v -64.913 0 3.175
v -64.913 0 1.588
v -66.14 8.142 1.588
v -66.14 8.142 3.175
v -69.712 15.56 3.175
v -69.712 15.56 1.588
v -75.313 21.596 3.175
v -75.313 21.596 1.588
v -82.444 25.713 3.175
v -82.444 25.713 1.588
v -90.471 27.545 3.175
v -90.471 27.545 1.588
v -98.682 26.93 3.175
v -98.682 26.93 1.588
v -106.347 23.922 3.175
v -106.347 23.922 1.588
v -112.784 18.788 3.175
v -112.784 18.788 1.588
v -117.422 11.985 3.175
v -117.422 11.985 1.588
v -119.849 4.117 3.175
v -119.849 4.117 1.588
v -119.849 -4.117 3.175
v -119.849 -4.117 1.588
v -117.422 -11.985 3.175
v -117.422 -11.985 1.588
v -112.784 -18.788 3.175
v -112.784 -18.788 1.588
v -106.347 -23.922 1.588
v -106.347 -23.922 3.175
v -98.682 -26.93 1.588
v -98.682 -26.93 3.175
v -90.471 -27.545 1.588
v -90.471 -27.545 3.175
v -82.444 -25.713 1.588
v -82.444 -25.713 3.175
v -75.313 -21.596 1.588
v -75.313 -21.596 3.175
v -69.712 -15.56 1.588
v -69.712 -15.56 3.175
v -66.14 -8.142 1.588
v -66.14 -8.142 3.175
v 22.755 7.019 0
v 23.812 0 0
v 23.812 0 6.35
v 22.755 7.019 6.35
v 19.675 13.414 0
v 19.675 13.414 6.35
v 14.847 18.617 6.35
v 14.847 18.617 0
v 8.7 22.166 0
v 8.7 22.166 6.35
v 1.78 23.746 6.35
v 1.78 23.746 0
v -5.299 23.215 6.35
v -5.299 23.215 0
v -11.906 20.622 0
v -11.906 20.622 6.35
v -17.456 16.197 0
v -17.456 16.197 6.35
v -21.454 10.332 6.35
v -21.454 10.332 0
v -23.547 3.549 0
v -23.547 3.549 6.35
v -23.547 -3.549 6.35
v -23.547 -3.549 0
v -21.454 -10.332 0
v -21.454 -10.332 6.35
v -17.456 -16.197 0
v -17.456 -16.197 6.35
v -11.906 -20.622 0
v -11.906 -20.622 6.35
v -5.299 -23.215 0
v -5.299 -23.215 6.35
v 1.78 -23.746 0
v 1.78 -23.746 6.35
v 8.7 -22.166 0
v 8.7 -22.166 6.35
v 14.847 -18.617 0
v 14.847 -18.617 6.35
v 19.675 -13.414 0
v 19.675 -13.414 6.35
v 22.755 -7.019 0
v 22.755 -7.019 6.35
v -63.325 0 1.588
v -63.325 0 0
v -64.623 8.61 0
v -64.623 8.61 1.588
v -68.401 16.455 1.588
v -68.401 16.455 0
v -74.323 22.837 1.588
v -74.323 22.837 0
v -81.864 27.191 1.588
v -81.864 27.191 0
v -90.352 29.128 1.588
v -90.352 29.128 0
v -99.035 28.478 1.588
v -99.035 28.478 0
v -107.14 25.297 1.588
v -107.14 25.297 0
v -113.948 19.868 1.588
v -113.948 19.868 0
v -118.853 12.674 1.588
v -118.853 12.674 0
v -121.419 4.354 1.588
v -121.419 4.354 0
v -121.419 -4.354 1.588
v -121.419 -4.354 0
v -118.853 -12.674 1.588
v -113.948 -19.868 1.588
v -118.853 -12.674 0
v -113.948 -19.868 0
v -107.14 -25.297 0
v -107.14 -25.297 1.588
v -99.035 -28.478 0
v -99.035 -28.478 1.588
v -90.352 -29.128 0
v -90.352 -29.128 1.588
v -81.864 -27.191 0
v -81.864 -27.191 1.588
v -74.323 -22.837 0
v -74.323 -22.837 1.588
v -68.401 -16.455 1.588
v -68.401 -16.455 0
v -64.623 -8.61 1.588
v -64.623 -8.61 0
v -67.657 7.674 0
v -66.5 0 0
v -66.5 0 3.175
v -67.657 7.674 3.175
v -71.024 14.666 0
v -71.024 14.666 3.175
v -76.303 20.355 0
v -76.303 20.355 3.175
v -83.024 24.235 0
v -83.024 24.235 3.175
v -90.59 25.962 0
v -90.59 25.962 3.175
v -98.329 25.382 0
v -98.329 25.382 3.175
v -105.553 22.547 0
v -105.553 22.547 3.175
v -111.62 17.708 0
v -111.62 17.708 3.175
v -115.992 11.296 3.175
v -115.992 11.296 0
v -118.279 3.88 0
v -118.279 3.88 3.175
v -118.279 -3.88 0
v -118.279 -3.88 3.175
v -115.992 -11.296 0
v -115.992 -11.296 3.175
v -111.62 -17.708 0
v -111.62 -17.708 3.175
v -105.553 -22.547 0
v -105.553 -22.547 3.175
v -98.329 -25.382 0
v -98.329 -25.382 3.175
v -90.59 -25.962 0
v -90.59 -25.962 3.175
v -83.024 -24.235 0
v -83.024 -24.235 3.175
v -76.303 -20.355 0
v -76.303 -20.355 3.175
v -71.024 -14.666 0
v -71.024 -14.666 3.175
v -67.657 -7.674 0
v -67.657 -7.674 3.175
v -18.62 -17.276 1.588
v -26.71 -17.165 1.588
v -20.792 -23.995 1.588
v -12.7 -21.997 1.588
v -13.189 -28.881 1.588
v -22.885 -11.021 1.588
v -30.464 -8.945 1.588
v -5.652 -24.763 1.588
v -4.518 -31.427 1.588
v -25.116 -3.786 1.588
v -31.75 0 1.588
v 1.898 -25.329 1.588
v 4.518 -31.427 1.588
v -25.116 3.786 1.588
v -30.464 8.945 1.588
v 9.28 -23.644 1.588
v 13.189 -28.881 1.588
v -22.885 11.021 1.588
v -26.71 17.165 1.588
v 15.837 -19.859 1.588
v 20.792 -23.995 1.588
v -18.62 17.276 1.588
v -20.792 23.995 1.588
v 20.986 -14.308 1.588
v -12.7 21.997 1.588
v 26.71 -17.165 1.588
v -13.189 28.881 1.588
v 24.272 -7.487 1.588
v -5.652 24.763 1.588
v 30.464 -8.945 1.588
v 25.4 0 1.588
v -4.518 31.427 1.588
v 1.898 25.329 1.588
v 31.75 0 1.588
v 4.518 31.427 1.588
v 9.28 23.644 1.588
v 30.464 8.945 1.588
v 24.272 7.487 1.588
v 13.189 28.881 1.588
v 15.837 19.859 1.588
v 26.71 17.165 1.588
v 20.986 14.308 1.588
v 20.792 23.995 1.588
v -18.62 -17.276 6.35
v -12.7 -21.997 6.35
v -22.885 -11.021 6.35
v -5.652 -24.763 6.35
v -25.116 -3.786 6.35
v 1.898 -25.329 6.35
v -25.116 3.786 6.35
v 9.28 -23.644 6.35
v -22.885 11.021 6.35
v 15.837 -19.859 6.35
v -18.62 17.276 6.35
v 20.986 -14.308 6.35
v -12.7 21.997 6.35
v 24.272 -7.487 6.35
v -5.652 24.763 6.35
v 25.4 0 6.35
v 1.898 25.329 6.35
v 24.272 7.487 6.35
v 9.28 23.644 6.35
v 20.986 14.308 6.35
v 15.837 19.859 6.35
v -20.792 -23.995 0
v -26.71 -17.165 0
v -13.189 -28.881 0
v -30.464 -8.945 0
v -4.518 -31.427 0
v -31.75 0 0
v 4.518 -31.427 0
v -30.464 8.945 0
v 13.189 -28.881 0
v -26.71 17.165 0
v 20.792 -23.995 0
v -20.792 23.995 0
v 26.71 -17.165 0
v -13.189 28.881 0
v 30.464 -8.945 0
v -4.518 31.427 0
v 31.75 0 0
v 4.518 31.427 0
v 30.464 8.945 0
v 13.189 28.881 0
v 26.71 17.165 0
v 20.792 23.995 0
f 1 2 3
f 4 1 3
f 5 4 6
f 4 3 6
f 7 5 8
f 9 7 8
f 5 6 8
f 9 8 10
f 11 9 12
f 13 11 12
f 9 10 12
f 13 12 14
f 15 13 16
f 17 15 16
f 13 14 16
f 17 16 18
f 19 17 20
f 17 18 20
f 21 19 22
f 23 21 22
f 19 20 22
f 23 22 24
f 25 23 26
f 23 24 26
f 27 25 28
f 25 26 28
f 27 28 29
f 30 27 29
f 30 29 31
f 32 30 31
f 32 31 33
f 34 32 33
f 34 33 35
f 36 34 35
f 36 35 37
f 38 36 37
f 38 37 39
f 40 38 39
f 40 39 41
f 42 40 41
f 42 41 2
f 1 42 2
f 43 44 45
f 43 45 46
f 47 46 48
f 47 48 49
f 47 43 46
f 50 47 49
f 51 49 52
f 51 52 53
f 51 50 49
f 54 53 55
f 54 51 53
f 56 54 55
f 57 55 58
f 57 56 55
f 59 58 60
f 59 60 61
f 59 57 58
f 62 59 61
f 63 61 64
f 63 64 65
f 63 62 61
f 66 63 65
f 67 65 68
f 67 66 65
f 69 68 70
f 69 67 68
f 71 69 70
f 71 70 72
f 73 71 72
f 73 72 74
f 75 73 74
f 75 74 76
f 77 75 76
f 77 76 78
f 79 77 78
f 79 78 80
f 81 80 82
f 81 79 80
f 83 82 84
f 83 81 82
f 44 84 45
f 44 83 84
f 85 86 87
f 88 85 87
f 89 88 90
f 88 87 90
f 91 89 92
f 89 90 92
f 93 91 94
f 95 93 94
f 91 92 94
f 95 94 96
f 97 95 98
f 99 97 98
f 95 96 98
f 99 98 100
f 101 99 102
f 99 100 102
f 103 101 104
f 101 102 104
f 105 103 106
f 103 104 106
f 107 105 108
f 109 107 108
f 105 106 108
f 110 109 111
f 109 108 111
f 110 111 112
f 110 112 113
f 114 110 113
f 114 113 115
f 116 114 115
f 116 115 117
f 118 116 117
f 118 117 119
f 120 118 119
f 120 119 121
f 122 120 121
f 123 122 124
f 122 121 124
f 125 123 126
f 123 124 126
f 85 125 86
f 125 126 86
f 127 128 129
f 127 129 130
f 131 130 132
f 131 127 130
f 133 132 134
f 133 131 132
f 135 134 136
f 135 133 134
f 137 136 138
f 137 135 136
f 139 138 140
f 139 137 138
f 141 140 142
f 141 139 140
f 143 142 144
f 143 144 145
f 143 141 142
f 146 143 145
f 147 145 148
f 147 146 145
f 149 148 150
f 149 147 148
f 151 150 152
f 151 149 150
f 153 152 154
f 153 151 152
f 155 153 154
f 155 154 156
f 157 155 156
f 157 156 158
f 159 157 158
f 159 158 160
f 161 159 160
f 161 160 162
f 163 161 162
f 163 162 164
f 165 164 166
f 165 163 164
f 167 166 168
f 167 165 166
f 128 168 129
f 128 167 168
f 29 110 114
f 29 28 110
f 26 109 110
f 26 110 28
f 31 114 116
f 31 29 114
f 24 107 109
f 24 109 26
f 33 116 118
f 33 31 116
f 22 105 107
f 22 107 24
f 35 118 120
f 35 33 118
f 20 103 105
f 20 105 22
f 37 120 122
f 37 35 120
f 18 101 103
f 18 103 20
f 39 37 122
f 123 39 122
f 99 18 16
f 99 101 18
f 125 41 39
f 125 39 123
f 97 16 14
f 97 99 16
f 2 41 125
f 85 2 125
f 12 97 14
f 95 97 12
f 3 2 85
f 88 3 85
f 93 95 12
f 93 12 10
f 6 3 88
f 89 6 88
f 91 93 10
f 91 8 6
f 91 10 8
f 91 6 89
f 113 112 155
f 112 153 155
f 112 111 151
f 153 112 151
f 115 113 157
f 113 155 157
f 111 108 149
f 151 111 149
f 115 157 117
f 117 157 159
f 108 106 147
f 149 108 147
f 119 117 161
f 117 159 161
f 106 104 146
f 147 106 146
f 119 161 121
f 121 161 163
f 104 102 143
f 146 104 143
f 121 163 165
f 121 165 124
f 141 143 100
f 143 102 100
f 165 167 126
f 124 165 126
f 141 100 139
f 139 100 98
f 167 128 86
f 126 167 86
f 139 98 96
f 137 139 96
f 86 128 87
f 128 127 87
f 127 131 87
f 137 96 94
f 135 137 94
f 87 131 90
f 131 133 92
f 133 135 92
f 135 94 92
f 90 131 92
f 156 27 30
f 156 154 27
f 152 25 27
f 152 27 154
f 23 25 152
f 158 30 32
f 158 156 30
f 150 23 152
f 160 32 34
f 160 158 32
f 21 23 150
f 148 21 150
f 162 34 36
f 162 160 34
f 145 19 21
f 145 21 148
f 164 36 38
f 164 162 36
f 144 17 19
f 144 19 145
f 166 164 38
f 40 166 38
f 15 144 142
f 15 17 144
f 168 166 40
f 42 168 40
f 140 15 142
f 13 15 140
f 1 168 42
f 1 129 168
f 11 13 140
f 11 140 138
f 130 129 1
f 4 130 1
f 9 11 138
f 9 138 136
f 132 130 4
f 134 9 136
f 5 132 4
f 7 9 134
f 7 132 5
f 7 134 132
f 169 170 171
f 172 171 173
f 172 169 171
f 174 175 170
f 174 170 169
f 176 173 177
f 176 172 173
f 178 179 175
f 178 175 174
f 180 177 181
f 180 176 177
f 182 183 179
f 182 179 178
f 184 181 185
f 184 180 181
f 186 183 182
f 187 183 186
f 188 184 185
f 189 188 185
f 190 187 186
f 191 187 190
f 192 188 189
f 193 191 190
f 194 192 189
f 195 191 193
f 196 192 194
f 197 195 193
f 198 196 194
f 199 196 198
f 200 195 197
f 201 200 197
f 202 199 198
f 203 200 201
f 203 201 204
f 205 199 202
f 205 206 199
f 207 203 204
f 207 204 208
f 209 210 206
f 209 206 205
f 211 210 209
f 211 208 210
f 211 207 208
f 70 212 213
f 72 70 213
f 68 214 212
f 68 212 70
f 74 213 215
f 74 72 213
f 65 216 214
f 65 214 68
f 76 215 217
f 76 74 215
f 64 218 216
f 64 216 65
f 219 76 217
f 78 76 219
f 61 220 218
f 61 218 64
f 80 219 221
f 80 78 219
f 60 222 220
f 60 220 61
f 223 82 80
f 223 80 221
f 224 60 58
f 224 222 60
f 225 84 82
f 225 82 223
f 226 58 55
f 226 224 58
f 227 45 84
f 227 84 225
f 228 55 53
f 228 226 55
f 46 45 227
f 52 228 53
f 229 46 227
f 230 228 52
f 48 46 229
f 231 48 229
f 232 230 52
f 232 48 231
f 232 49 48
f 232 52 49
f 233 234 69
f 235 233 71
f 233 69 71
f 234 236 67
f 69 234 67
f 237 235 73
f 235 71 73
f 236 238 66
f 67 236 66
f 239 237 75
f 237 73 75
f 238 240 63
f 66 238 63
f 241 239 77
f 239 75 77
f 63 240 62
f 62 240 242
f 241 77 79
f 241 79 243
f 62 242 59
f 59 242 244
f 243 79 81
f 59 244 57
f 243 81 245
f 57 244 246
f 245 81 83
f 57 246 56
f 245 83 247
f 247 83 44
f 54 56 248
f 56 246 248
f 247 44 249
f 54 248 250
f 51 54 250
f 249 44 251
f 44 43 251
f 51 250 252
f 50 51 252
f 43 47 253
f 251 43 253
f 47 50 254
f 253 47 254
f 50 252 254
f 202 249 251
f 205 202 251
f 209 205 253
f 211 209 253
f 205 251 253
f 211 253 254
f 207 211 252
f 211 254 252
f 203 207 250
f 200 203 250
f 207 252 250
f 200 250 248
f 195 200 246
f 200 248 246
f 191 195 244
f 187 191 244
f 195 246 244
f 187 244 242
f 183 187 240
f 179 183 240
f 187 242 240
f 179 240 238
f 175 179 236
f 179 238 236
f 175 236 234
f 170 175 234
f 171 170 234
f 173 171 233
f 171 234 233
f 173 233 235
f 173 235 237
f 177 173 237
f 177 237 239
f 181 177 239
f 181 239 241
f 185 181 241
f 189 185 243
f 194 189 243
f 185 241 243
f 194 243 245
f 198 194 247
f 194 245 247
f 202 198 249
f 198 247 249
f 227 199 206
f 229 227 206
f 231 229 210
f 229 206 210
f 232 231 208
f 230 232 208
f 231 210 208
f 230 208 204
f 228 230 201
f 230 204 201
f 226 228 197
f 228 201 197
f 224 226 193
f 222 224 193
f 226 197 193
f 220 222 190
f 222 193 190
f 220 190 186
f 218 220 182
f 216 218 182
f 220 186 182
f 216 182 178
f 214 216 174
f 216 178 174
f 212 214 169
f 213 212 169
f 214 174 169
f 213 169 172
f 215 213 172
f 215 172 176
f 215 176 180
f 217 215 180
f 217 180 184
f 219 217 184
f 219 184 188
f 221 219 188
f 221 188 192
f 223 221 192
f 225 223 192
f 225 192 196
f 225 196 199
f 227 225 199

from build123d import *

# Parameters (mm, degrees)
F0_R     = 31.75
F0_R_2   = 25.4
F1_DEPTH = 1.5875
F0_R_3   = 23.8125
F2_DEPTH = 6.35
F3_R     = 27.6225
F3_R_2   = 26.035
F4_DEPTH = 3.175
F3_R_3   = 29.21
F5_DEPTH = 1.5875


with BuildPart() as f1:
    # F0 (on Top) → F1 (new body)
    with BuildSketch(Plane.XY):
        Circle(F0_R)
        Circle(F0_R_2, mode=Mode.SUBTRACT)
    extrude(amount=F1_DEPTH)

    # F0 (on Top) → F2 (join)
    with BuildSketch(Plane.XY):
        Circle(F0_R_2)
        Circle(F0_R_3, mode=Mode.SUBTRACT)
    extrude(amount=F2_DEPTH)


with BuildPart() as f4:
    # F3 (on Top) → F4 (new body)
    with BuildSketch(Plane.XY):
        with Locations((-92.535257, 0)):
            Circle(F3_R)
        with Locations((-92.535257, 0)):
            Circle(F3_R_2, mode=Mode.SUBTRACT)
    extrude(amount=F4_DEPTH)

    # F3 (on Top) → F5 (join)
    with BuildSketch(Plane.XY):
        with Locations((-92.535257, 0)):
            Circle(F3_R_3)
        with Locations((-92.535257, 0)):
            Circle(F3_R, mode=Mode.SUBTRACT)
    extrude(amount=F5_DEPTH)


solid = Compound([f1.part, f4.part])
